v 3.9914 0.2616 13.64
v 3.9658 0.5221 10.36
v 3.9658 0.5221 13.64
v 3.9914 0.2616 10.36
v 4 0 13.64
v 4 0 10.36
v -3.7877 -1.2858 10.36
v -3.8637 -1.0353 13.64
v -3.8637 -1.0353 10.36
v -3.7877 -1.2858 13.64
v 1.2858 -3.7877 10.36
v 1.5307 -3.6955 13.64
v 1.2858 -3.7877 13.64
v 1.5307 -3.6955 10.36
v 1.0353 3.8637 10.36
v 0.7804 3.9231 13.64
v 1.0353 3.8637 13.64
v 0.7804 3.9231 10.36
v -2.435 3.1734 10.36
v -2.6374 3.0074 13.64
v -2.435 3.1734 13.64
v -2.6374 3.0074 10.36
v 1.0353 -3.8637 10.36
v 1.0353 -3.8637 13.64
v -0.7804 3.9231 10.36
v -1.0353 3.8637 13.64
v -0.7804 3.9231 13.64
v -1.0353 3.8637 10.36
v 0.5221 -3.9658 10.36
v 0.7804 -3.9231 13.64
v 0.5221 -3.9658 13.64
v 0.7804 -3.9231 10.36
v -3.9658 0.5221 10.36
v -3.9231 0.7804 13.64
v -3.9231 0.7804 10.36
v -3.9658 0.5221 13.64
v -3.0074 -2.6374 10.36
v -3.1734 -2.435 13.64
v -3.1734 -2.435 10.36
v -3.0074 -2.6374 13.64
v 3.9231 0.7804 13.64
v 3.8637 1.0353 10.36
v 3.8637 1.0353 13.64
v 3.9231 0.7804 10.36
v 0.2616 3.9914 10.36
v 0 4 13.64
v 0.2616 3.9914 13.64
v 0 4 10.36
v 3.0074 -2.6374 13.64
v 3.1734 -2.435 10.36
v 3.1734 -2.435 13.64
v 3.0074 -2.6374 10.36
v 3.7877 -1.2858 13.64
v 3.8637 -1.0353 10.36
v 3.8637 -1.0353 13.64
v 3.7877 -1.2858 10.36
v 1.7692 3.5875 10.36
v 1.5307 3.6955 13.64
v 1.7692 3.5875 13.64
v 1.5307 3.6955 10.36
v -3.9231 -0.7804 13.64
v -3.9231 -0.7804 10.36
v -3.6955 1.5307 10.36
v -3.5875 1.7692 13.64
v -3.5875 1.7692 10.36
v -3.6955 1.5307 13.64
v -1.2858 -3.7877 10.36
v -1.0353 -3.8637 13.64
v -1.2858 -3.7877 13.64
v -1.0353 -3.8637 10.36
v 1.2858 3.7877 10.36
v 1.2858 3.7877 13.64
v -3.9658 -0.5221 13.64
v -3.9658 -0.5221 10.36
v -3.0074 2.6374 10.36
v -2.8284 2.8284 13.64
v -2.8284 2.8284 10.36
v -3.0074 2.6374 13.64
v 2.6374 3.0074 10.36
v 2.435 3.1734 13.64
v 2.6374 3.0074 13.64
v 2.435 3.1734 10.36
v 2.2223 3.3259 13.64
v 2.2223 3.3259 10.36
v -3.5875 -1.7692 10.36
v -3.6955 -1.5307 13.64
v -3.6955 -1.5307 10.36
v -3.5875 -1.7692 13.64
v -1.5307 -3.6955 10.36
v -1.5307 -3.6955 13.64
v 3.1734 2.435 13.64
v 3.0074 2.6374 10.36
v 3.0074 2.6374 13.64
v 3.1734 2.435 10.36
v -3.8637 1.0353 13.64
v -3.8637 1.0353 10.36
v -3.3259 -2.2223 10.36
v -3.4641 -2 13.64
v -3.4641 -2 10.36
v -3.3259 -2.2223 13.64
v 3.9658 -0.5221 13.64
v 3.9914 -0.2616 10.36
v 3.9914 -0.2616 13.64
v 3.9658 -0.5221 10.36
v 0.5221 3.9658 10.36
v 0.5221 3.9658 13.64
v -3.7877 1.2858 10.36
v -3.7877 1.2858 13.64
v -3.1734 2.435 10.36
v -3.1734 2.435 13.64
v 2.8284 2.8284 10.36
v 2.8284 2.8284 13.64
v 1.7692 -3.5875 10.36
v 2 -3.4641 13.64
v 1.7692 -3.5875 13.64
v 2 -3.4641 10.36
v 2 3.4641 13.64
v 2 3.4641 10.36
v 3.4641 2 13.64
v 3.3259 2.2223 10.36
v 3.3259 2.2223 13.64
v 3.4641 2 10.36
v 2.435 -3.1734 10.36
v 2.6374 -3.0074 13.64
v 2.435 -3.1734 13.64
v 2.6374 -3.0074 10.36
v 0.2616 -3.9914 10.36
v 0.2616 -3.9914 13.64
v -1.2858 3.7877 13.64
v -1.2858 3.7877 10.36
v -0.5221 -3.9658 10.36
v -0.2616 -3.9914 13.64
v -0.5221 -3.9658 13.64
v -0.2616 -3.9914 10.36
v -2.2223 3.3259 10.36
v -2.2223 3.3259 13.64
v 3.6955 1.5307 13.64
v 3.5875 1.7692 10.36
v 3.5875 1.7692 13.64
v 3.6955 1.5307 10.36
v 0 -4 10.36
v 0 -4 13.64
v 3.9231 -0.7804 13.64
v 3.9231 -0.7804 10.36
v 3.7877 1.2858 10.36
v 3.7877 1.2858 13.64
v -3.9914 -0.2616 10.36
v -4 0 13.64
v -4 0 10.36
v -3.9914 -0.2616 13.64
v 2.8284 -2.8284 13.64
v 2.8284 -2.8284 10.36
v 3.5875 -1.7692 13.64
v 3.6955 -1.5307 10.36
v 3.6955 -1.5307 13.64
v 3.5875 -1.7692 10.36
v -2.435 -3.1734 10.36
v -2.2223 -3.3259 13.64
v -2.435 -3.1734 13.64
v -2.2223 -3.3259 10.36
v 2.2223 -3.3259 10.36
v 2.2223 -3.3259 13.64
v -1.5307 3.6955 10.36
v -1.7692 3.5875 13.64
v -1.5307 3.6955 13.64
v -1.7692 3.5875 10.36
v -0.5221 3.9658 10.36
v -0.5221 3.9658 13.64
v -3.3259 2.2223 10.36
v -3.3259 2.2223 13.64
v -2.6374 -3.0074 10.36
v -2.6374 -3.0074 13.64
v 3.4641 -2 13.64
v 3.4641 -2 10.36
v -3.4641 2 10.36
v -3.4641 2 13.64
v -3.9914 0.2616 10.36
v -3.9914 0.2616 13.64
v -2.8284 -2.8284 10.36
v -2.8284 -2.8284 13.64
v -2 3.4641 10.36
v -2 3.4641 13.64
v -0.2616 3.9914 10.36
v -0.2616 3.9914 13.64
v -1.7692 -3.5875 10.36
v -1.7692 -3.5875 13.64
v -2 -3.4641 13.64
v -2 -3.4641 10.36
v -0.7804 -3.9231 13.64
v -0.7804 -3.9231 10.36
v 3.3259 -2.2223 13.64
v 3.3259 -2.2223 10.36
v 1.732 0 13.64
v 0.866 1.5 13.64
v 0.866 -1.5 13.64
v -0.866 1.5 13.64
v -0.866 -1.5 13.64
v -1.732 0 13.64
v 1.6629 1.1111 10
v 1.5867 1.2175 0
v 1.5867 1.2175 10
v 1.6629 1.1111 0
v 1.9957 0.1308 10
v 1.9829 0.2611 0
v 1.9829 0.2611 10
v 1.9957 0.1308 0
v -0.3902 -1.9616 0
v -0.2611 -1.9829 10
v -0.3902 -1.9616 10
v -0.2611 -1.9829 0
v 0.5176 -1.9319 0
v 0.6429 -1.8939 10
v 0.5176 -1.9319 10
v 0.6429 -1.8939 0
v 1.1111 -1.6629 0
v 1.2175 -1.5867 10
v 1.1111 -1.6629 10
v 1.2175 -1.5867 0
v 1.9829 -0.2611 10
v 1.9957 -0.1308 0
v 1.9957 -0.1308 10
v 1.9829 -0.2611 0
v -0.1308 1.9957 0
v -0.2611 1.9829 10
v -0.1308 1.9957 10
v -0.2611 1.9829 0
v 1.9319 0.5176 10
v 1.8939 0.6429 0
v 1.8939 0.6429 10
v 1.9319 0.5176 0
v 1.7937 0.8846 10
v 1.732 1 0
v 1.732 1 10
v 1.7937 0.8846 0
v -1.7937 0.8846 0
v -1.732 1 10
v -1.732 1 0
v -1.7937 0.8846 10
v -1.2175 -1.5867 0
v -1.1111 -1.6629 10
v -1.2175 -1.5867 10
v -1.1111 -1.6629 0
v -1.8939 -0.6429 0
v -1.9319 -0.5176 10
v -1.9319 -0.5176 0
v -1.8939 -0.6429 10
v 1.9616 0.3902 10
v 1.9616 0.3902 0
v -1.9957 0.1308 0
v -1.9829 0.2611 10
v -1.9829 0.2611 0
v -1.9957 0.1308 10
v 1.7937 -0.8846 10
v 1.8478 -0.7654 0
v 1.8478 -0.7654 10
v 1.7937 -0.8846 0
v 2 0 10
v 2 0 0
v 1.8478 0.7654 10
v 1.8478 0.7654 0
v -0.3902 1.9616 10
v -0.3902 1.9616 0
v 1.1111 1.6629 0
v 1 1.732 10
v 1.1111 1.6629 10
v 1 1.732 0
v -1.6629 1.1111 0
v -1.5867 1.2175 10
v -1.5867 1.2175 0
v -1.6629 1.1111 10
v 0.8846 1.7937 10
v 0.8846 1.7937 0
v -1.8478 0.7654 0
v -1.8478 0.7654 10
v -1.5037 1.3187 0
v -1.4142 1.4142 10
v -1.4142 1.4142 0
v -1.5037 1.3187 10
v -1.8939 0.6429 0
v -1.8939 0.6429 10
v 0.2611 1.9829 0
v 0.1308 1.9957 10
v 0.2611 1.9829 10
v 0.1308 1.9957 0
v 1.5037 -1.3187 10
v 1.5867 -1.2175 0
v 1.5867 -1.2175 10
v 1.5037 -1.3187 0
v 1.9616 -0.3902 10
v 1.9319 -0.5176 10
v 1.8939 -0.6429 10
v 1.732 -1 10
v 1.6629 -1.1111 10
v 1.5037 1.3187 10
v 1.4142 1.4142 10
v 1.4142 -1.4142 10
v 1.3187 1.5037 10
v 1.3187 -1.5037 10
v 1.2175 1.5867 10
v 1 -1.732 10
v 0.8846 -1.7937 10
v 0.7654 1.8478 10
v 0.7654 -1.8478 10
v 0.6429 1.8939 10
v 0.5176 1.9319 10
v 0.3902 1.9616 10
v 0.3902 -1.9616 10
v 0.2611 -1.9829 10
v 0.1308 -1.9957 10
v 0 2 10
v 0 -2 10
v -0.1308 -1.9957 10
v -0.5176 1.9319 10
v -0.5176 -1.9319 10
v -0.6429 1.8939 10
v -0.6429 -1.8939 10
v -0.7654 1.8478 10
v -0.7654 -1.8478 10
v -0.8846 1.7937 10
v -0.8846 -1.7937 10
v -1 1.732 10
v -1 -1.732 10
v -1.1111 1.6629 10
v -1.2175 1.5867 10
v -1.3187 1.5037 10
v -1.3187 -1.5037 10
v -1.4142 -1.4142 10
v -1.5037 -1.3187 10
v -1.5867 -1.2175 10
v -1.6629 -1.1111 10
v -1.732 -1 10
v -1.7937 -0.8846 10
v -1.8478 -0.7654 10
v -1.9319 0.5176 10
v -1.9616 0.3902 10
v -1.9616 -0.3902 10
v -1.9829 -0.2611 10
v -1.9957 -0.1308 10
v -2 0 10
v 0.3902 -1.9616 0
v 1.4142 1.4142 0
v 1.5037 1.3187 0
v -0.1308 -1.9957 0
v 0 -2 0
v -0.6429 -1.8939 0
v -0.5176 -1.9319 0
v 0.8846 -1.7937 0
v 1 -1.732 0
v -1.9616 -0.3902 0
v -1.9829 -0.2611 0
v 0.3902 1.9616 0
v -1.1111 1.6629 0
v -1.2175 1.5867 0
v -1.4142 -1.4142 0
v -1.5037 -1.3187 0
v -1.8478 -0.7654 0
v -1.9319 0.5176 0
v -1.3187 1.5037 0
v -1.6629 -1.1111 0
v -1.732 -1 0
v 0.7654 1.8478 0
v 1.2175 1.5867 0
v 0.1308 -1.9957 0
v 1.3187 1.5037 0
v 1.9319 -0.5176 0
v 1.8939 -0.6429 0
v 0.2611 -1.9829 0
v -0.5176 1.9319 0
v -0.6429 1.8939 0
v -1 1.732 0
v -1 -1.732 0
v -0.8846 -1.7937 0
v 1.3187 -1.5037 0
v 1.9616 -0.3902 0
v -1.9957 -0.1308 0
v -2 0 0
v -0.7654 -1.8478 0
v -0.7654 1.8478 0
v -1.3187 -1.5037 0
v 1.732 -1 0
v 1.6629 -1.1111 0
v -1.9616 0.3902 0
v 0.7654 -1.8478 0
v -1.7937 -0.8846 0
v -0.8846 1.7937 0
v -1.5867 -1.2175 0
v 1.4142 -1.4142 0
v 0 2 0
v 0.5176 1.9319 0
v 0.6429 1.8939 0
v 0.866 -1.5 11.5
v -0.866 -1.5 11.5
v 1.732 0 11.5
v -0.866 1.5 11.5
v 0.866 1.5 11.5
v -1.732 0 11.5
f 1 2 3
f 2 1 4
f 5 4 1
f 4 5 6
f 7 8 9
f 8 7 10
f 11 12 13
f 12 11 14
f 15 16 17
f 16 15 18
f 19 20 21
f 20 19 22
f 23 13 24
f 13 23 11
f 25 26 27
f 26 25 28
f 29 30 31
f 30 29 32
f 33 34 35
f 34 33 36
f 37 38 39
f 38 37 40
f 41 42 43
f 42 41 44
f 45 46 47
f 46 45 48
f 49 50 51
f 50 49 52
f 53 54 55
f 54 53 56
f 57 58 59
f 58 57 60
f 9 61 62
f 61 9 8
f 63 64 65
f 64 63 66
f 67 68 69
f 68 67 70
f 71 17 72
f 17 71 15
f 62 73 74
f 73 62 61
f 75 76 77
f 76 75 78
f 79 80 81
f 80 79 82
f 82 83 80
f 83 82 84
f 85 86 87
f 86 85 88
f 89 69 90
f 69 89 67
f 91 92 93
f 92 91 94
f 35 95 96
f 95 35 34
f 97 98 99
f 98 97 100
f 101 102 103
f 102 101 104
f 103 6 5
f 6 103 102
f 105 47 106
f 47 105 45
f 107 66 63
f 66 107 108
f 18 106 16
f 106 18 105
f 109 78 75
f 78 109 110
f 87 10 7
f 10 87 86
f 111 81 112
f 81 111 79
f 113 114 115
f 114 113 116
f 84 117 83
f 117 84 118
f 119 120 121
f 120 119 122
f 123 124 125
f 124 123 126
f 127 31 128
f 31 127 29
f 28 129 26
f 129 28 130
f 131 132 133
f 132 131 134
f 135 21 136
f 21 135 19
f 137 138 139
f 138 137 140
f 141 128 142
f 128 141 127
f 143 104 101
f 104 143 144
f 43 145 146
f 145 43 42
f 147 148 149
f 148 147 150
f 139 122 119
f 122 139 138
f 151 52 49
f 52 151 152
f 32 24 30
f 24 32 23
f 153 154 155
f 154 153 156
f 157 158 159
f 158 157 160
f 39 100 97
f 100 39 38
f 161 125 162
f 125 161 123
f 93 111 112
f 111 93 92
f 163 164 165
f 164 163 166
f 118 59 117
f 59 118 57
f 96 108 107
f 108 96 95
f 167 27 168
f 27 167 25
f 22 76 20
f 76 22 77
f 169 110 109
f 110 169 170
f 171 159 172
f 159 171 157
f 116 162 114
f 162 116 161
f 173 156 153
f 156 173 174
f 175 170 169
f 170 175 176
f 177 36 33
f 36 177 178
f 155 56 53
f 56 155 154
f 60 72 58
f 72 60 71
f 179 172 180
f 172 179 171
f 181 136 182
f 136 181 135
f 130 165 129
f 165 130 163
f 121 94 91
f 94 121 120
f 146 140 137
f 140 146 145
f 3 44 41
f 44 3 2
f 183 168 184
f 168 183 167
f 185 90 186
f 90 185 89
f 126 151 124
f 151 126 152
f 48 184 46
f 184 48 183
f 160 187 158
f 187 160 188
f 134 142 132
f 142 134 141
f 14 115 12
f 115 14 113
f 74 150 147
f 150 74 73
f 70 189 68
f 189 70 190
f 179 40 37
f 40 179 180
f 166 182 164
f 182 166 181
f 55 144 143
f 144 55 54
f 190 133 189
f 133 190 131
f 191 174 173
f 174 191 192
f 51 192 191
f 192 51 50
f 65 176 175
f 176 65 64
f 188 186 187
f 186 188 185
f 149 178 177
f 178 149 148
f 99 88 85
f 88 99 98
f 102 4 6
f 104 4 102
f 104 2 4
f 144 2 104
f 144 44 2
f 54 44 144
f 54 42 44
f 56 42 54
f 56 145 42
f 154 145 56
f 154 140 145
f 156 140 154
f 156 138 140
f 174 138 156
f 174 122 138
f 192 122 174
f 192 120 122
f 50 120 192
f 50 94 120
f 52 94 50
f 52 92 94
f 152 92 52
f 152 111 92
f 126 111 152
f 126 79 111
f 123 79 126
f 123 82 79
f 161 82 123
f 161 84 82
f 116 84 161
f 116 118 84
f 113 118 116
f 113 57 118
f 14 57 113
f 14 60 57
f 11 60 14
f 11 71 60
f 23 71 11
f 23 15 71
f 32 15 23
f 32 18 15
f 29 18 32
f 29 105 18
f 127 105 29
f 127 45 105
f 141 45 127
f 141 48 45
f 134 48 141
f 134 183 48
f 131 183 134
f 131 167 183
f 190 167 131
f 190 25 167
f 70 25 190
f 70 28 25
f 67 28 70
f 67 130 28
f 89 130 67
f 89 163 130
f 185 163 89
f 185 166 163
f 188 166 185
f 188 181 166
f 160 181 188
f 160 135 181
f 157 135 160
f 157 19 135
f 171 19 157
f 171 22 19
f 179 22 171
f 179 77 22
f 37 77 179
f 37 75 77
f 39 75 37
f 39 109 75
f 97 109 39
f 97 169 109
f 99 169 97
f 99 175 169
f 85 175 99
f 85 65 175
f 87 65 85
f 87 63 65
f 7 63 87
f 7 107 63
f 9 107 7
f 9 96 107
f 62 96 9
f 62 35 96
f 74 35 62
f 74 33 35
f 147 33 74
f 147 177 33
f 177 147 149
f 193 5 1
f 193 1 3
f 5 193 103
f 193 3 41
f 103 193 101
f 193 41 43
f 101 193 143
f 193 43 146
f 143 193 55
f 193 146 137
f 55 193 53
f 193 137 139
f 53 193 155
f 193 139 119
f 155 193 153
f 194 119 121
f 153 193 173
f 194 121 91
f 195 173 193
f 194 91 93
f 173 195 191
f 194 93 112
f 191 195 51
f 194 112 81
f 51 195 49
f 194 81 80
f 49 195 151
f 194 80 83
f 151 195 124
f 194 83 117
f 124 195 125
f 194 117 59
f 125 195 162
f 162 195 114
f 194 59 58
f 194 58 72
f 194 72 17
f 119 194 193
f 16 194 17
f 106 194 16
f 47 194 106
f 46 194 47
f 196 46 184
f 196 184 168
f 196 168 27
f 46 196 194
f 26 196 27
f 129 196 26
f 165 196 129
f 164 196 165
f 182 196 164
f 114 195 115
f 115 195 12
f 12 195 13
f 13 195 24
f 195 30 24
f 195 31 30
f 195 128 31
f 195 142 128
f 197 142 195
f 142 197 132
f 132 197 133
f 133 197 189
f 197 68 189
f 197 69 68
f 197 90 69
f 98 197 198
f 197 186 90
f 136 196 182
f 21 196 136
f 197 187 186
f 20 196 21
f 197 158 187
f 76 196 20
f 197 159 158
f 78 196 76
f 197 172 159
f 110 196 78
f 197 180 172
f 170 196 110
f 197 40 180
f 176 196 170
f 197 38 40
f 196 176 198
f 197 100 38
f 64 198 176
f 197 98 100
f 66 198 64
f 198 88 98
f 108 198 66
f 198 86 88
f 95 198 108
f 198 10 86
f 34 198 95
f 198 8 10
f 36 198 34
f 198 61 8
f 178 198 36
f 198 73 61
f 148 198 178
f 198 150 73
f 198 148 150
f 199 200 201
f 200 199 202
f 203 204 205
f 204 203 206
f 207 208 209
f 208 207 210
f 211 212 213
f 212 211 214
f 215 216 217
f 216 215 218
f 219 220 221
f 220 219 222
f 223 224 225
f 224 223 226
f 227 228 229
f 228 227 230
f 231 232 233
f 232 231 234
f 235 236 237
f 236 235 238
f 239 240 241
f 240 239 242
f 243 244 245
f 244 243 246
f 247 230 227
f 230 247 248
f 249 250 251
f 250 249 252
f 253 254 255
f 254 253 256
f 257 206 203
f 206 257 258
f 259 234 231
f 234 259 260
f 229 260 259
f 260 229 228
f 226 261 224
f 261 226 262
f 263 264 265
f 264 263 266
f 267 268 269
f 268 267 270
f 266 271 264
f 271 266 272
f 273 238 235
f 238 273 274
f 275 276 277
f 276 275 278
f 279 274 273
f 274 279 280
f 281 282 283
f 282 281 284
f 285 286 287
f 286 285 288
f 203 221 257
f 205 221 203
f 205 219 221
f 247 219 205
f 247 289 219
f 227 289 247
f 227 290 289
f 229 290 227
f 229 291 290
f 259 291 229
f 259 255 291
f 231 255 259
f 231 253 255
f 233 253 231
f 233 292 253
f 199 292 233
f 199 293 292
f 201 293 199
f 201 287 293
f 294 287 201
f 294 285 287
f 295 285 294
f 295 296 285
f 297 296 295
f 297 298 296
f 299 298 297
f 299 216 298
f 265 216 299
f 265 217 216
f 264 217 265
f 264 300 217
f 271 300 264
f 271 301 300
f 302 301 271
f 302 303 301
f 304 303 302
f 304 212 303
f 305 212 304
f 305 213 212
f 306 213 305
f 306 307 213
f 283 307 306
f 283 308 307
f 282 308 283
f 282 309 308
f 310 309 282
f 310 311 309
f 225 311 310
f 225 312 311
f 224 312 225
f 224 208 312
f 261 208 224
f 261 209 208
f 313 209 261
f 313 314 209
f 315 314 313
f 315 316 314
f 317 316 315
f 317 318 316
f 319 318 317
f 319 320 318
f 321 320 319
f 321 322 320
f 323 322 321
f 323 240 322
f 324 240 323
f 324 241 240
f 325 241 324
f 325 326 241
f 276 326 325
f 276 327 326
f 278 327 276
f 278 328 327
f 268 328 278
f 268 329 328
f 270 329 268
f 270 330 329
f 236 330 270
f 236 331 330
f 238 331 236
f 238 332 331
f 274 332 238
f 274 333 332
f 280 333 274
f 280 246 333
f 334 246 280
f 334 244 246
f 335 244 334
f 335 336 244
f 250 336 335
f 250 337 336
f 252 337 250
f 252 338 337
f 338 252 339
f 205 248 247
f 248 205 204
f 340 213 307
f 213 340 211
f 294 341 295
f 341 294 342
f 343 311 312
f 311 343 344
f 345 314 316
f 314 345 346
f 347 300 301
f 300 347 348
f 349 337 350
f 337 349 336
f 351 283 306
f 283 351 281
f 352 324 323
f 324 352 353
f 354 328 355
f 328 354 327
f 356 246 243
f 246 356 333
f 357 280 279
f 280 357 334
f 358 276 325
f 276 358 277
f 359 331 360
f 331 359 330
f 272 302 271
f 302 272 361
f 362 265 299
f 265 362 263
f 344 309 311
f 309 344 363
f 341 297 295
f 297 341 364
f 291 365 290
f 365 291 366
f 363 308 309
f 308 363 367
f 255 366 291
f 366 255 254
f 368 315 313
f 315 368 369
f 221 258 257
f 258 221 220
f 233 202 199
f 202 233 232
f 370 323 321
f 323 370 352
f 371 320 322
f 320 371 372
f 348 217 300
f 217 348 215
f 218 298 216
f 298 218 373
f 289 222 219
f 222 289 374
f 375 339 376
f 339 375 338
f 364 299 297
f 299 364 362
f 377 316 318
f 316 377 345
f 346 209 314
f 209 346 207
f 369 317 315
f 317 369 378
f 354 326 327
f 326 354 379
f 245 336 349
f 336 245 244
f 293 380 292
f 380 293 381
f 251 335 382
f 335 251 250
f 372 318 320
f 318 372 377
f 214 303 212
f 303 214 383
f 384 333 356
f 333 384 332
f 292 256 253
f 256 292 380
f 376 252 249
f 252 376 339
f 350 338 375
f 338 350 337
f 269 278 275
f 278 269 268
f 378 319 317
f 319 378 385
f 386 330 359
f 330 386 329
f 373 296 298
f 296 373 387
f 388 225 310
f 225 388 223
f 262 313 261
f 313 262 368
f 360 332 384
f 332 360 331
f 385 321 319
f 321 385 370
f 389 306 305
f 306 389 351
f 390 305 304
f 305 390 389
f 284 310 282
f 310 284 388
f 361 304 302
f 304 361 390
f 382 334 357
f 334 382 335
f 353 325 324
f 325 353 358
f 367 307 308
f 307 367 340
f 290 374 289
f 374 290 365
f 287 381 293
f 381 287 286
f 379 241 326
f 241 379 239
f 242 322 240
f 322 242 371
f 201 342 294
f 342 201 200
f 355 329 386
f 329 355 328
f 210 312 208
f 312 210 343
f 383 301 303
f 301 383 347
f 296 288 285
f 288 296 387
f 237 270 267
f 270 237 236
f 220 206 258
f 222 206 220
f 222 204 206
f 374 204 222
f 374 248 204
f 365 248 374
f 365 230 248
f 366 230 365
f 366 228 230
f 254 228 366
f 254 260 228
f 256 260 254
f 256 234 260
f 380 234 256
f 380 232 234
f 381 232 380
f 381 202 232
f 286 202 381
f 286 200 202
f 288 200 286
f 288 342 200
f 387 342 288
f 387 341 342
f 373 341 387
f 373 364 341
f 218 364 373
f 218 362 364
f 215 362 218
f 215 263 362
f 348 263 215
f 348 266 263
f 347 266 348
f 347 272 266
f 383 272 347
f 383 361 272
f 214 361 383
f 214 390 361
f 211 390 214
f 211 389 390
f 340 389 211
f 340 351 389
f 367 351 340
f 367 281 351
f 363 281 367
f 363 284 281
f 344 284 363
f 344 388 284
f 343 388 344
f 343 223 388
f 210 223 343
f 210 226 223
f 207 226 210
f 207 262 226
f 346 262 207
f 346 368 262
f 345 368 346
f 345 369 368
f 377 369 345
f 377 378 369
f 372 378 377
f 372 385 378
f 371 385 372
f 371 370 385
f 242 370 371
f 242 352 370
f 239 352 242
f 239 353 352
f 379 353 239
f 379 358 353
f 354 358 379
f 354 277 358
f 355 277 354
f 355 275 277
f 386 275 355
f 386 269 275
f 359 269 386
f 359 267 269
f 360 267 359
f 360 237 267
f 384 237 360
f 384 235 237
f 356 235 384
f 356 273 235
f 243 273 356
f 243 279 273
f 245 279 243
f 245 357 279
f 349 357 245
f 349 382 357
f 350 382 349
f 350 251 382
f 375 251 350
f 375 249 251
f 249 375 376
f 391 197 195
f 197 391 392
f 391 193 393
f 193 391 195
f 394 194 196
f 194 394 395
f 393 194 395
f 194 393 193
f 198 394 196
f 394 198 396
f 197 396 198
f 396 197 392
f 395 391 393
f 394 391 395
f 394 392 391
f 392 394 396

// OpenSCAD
$fn=96;

// Socket Head Cap Screw (approx. ISO 4762)
// Parameters from prompt:
d_shank = 4.0;      // mm
d_head  = 8.0;      // mm
L       = 10.0;     // mm overall length under head
k       = 4.0;      // head height (typical for M4)
socket_d = 3.0;     // hex socket across flats (typical for M4)
socket_depth = 2.5; // socket depth (typical)
tip_chamfer = 0.4;  // small chamfer at end
head_edge_chamfer = 0.35;

module hex_prism_af(af, h){
    // Regular hex with given across-flats
    r = af / sqrt(3); // circumradius
    cylinder(h=h, r=r, $fn=6);
}

module chamfered_cylinder(h, d, chamfer=0.3){
    // Simple chamfer both ends by subtracting cones
    difference(){
        cylinder(h=h, d=d);
        // bottom chamfer
        translate([0,0,-0.01])
            cylinder(h=chamfer+0.02, d1=d+2*chamfer, d2=d);
        // top chamfer
        translate([0,0,h-chamfer-0.01])
            cylinder(h=chamfer+0.02, d1=d, d2=d+2*chamfer);
    }
}

module socket_head_cap_screw(){
    difference(){
        union(){
            // Shank
            translate([0,0,0])
                cylinder(h=L, d=d_shank);

            // Tip chamfer
            translate([0,0,0])
                difference(){
                    cylinder(h=tip_chamfer, d=d_shank);
                    translate([0,0,-0.01])
                        cylinder(h=tip_chamfer+0.02, d1=d_shank+2*tip_chamfer, d2=d_shank);
                }

            // Head
            translate([0,0,L])
                chamfered_cylinder(h=k, d=d_head, chamfer=head_edge_chamfer);
        }

        // Hex socket cut
        translate([0,0,L + k - socket_depth])
            hex_prism_af(socket_d, socket_depth + 0.2);
    }
}

socket_head_cap_screw();
